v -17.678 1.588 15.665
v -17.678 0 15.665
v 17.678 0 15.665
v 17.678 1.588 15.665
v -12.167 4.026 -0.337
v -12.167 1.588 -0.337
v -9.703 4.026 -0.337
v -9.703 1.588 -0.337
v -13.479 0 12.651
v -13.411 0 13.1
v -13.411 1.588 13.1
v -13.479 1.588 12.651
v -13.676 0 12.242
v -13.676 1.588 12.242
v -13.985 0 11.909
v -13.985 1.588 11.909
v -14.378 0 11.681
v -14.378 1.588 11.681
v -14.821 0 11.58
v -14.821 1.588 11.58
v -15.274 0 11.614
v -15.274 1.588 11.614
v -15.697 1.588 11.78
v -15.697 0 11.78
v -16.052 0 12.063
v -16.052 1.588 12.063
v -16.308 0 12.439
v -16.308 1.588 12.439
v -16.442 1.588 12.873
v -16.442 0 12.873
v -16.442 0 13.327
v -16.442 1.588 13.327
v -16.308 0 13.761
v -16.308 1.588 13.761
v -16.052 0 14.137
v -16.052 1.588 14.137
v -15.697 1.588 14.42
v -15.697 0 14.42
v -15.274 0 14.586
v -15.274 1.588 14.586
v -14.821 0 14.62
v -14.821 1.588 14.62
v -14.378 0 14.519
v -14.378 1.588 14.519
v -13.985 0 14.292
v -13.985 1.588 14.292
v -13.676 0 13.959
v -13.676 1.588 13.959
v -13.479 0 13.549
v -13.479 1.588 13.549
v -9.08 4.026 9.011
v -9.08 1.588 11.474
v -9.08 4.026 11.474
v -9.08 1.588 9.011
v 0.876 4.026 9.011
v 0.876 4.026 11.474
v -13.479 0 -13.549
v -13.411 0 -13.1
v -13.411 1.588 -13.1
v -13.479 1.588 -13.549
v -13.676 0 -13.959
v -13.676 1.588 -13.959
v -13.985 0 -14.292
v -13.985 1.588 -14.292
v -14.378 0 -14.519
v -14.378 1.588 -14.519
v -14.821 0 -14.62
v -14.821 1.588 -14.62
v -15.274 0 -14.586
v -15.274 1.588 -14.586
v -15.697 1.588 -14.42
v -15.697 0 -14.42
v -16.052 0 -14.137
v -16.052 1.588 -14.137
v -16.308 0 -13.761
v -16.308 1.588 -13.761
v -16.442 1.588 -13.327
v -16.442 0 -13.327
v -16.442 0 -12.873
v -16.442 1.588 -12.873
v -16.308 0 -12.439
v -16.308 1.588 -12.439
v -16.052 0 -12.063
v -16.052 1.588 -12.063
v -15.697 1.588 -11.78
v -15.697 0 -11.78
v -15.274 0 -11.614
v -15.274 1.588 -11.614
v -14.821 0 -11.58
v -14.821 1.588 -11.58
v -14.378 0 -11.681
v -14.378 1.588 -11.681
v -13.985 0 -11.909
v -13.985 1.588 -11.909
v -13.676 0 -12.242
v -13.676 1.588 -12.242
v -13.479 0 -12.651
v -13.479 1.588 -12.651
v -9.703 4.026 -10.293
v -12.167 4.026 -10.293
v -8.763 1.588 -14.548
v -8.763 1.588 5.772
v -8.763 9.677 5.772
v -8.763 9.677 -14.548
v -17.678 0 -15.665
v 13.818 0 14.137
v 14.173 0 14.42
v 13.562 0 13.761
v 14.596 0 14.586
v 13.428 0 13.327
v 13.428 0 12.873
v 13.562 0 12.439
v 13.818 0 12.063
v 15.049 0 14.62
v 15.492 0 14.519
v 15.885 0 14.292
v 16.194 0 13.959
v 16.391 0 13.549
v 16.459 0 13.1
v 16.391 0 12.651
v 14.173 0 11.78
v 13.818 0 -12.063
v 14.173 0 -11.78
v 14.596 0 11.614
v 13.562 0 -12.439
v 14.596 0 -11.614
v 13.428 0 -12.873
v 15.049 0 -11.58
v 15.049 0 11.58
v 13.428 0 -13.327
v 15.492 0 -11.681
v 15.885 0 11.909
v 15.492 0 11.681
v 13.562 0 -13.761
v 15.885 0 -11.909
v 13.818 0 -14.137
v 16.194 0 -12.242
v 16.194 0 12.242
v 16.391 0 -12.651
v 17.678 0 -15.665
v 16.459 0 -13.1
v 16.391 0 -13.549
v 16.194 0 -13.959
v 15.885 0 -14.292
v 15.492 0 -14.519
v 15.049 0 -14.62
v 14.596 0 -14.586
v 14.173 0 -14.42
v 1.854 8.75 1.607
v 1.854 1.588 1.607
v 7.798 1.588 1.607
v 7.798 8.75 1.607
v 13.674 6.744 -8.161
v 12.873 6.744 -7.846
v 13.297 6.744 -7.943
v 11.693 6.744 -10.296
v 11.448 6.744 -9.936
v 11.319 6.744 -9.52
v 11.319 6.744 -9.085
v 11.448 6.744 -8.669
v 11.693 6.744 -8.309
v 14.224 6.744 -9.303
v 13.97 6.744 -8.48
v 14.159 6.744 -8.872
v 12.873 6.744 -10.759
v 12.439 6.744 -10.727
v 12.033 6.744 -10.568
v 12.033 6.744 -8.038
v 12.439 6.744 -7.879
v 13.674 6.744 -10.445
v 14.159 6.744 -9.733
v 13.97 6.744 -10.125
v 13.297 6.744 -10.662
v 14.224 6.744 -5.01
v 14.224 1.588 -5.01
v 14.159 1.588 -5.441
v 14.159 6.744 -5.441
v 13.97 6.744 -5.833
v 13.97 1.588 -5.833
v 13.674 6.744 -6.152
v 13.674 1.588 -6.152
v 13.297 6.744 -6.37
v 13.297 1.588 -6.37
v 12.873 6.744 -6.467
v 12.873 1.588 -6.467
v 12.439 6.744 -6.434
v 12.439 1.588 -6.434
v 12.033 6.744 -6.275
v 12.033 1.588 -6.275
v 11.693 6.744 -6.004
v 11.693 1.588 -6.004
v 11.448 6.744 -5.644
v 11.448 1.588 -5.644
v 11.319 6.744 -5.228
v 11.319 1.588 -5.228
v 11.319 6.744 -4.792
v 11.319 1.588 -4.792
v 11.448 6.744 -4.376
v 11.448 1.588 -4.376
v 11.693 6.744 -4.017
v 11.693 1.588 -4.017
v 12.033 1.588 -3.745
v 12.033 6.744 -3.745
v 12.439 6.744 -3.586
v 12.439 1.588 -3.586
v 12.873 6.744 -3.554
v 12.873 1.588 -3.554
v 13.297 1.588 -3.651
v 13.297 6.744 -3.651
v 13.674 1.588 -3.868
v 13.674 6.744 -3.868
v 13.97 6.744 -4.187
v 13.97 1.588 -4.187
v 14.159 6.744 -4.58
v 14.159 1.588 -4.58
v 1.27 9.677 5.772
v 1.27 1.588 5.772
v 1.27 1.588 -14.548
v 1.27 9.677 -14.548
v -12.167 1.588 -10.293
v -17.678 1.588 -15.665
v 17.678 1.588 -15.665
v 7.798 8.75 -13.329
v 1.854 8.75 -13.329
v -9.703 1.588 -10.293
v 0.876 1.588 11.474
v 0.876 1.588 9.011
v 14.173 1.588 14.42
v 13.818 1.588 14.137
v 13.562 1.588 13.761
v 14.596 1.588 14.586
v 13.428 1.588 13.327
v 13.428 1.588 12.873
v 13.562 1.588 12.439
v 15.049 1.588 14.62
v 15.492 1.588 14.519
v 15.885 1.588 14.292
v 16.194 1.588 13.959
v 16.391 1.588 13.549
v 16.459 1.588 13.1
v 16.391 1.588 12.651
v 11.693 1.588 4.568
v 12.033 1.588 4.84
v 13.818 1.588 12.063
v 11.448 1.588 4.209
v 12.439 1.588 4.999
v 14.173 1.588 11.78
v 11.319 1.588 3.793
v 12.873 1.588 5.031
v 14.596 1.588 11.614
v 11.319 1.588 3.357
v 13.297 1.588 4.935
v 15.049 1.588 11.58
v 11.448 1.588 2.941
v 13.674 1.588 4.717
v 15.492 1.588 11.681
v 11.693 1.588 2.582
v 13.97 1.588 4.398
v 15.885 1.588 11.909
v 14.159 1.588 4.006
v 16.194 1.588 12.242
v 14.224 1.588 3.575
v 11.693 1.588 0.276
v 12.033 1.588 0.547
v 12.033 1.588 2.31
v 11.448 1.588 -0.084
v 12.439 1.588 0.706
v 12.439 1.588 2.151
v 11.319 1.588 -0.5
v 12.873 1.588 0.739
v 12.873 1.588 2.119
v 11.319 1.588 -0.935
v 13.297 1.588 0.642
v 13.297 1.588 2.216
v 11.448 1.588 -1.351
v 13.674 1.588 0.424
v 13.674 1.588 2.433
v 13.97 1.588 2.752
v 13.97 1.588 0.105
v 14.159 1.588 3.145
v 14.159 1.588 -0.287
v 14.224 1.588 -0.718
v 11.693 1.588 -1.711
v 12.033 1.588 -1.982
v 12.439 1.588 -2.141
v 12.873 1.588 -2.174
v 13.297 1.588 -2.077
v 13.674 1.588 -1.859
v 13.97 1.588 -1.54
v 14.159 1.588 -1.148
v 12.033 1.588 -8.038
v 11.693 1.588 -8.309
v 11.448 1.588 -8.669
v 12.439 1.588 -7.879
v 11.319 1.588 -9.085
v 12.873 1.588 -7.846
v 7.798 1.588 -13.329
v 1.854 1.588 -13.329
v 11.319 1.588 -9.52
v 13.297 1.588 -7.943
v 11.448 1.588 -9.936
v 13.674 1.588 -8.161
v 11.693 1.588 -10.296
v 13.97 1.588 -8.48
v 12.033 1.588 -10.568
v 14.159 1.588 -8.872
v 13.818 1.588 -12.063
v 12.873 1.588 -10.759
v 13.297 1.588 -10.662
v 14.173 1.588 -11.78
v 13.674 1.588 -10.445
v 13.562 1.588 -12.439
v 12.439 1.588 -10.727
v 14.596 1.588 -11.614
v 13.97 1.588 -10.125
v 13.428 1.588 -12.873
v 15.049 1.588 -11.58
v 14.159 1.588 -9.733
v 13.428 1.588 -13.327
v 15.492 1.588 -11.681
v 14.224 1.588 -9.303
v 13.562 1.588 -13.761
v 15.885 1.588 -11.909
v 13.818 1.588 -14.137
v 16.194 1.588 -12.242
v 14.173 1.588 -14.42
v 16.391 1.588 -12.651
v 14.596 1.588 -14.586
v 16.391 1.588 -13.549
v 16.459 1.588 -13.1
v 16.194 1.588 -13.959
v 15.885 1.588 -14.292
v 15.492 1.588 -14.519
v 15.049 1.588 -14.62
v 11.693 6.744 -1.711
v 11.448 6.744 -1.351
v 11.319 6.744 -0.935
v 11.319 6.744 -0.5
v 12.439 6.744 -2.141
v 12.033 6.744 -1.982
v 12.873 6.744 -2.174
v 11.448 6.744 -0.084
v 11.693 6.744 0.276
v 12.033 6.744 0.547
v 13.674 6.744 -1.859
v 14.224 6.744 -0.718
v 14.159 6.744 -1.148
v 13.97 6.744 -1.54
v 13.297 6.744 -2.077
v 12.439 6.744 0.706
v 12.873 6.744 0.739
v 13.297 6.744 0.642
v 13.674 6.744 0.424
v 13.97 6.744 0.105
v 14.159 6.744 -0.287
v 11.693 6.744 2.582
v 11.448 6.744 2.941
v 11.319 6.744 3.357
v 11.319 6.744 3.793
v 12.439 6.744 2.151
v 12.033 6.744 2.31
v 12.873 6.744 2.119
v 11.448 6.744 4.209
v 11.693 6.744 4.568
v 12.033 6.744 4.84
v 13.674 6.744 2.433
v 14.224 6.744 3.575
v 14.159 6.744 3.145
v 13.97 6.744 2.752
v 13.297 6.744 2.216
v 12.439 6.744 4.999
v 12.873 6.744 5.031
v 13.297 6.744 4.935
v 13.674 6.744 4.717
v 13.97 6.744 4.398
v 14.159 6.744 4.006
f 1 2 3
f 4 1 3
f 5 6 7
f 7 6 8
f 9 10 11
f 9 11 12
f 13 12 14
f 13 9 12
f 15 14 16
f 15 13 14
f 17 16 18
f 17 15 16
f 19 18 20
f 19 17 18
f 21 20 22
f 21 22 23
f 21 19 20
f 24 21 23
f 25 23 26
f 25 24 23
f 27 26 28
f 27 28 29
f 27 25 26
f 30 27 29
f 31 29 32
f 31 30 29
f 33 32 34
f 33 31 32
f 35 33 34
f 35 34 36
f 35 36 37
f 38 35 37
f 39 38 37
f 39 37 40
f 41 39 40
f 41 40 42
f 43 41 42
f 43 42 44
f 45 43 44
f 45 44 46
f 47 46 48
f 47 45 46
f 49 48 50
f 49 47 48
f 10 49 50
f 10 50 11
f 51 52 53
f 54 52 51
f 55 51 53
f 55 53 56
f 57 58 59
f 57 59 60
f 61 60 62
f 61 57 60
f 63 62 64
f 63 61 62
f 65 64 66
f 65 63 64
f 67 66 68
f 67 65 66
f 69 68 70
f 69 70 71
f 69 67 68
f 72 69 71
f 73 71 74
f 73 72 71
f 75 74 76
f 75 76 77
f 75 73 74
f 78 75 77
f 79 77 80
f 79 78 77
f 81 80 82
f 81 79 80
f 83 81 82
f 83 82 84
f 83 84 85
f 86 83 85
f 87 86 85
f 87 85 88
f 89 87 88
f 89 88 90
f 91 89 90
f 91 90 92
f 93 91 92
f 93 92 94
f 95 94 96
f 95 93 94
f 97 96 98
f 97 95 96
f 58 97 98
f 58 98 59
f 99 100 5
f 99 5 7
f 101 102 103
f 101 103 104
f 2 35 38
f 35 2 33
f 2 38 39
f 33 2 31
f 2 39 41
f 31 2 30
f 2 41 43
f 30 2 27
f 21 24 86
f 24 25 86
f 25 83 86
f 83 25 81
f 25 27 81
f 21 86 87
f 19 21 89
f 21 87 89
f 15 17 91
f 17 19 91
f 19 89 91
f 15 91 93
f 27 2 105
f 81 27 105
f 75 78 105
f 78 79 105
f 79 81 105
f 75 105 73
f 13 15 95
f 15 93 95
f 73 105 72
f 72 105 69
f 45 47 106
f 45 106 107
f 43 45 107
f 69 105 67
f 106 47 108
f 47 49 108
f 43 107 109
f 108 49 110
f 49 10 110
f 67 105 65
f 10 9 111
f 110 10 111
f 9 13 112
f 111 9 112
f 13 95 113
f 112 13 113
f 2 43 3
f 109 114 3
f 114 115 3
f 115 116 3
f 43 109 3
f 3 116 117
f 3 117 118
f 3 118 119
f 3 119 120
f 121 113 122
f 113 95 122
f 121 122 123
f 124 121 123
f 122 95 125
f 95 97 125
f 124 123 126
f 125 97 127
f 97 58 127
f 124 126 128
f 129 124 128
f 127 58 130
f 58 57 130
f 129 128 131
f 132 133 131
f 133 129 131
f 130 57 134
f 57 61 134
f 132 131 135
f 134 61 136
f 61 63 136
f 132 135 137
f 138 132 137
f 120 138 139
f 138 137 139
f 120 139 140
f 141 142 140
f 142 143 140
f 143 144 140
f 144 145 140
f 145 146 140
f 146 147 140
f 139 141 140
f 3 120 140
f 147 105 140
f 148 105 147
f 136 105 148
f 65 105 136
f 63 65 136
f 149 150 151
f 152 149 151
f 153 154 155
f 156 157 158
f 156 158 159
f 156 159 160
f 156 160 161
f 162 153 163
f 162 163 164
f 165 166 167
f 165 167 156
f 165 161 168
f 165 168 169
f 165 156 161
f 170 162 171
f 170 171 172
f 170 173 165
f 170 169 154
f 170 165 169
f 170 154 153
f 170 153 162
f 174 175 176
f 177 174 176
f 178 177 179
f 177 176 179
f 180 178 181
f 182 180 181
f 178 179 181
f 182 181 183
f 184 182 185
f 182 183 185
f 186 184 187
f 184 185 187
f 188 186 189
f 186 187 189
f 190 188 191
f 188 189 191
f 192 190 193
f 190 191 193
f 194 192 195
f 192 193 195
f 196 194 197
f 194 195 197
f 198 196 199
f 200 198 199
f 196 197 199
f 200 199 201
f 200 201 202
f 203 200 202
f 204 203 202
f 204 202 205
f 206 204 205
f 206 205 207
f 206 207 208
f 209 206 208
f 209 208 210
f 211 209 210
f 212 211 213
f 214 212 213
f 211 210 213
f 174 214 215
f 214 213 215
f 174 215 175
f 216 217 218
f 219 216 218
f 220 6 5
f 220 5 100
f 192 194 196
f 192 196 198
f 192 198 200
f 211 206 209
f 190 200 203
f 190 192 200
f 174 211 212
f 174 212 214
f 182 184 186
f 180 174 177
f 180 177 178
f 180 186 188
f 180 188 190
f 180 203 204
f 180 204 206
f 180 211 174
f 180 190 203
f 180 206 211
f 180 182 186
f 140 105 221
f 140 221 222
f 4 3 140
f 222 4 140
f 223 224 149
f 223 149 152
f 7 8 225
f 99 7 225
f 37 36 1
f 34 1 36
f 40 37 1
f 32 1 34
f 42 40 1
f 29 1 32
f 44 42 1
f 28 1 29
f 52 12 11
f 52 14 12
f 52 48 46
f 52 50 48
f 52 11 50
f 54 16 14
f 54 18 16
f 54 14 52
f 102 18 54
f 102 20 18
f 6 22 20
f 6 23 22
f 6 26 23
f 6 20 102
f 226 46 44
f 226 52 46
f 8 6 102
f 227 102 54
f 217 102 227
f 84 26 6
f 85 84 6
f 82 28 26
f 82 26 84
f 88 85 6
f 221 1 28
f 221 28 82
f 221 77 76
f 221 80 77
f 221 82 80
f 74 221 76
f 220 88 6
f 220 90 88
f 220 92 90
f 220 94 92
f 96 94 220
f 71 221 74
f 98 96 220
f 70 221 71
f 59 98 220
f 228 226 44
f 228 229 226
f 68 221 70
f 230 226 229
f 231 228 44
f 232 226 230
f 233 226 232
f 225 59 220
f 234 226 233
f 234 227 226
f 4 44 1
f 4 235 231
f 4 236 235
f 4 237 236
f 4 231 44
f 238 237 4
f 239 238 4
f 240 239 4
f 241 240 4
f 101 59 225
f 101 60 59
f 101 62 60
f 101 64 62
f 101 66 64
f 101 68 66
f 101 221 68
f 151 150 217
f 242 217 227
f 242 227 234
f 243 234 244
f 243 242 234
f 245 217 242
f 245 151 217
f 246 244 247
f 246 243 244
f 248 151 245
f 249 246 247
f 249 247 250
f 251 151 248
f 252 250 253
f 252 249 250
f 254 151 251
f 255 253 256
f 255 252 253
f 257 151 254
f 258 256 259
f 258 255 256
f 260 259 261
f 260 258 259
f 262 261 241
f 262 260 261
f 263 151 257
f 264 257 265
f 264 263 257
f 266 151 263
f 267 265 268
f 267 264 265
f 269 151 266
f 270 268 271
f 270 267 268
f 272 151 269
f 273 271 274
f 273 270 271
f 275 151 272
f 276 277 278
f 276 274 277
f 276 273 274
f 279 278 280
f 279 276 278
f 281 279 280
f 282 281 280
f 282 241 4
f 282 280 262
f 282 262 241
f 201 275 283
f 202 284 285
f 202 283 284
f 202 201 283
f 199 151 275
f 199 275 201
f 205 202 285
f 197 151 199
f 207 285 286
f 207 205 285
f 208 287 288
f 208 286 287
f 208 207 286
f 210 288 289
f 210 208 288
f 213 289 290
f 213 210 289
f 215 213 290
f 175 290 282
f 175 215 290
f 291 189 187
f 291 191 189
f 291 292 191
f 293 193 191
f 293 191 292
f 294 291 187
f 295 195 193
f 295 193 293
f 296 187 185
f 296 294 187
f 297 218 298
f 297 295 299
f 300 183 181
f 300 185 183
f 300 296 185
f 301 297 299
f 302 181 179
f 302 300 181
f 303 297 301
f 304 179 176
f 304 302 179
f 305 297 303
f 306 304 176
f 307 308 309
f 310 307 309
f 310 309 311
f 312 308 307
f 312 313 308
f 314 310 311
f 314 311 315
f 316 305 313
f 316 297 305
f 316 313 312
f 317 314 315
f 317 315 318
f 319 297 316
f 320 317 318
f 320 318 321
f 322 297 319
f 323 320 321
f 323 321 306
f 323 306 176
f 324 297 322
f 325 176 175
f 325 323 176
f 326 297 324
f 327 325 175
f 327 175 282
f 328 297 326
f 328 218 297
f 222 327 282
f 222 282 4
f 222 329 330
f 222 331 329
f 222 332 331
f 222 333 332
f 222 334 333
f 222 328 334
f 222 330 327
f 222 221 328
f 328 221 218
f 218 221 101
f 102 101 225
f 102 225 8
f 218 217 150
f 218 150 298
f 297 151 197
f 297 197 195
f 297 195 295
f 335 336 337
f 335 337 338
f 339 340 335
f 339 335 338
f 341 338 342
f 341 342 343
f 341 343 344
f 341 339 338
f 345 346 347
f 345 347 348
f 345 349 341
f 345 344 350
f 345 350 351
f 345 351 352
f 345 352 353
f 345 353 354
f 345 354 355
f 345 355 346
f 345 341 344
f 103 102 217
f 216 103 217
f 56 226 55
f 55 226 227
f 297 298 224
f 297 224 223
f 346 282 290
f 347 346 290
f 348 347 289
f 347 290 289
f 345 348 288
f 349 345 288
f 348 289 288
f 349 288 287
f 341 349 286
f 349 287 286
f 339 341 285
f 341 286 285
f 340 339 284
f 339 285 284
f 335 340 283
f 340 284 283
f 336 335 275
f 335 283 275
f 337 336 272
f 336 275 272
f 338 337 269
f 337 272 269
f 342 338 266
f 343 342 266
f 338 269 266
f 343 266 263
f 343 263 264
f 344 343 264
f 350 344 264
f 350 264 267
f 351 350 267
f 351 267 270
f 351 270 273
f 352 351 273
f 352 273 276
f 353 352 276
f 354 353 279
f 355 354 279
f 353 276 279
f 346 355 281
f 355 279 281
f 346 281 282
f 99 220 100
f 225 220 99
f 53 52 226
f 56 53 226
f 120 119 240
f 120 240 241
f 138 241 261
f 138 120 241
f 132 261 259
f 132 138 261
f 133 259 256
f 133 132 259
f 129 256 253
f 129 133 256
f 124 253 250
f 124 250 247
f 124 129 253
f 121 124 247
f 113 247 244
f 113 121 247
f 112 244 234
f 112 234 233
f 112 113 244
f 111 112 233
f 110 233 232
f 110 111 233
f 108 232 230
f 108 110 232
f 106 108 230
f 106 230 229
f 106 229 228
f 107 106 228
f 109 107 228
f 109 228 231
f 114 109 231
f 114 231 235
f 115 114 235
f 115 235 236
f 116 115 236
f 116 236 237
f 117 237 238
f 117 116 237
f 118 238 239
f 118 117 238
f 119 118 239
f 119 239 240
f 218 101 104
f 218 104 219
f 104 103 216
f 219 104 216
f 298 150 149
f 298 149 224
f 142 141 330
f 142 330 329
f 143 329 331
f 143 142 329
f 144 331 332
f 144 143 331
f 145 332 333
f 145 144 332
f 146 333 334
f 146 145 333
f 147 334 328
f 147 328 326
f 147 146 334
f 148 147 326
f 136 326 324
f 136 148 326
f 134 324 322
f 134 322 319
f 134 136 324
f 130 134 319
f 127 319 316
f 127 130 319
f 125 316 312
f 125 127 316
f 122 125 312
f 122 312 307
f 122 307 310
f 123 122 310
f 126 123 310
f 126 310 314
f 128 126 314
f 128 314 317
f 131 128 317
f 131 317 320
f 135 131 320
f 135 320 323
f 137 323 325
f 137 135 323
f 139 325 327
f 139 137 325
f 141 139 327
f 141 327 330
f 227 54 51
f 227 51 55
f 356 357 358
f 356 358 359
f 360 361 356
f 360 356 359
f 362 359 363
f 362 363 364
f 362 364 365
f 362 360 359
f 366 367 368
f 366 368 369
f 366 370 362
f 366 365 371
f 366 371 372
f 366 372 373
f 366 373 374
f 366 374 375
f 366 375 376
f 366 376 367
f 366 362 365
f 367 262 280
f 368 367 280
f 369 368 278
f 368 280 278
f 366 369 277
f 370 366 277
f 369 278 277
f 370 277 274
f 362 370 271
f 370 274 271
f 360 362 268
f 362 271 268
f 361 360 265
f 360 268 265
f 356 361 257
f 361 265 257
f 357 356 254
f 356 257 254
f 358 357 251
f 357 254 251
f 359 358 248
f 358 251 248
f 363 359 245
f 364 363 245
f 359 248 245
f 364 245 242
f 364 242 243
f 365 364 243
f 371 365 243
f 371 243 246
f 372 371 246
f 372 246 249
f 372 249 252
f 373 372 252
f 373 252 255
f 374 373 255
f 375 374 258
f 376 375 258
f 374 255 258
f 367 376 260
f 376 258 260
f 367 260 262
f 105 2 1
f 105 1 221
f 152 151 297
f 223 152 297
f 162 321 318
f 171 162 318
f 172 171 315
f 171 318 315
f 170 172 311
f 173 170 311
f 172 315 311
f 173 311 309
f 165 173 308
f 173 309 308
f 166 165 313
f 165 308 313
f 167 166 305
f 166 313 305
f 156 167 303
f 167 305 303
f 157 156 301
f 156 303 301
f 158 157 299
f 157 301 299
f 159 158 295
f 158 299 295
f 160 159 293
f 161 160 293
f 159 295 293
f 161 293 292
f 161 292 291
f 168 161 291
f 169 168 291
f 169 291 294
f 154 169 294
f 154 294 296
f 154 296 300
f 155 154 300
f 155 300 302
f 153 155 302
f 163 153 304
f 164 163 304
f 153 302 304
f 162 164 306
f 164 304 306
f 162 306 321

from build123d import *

# Parameters (mm, degrees)
SKETCH1_W           = 35.3568
SKETCH1_H           = 31.3309
SKETCH1_R           = 1.524
BOSS_EXTRUDE1_DEPTH = 1.5875
SKETCH2_W           = 2.4638
SKETCH2_H           = 9.9568
SKETCH2_W_2         = 9.9568
SKETCH2_H_2         = 2.4638
BOSS_EXTRUDE2_DEPTH = 2.4384
SKETCH3_W           = 10.033
SKETCH3_H           = 20.32
BOSS_EXTRUDE3_DEPTH = 8.0899
SKETCH4_W           = 5.9436
SKETCH4_H           = 14.9352
BOSS_EXTRUDE4_DEPTH = 7.1628
SKETCH5_R           = 1.4605
BOSS_EXTRUDE5_DEPTH = 5.1562


with BuildPart() as part:
    # Sketch1 → Boss-Extrude1 (new body)
    with BuildSketch(Plane(origin=(0, 0, 0), x_dir=(1, 0, 0), z_dir=(0, 1, 0))):
        Rectangle(SKETCH1_W, SKETCH1_H)
        with Locations((14.9352, -13.10005)):
            Circle(SKETCH1_R, mode=Mode.SUBTRACT)
        with Locations((14.9352, 13.10005)):
            Circle(SKETCH1_R, mode=Mode.SUBTRACT)
        with Locations((-14.9352, -13.10005)):
            Circle(SKETCH1_R, mode=Mode.SUBTRACT)
        with Locations((-14.9352, 13.10005)):
            Circle(SKETCH1_R, mode=Mode.SUBTRACT)
    extrude(amount=BOSS_EXTRUDE1_DEPTH)

    # Sketch2 → Boss-Extrude2 (add)
    with BuildSketch(Plane(origin=(0, 1.5875, 0), x_dir=(1, 0, 0), z_dir=(0, 1, 0))):
        with Locations((-10.9347, 5.31495)):
            Rectangle(SKETCH2_W, SKETCH2_H)
        with Locations((-4.1021, -10.24255)):
            Rectangle(SKETCH2_W_2, SKETCH2_H_2)
    extrude(amount=BOSS_EXTRUDE2_DEPTH)

    # Sketch3 → Boss-Extrude3 (add)
    with BuildSketch(Plane(origin=(0, 1.5875, 0), x_dir=(1, 0, 0), z_dir=(0, 1, 0))):
        with Locations((-3.7465, 4.38785)):
            Rectangle(SKETCH3_W, SKETCH3_H)
    extrude(amount=BOSS_EXTRUDE3_DEPTH)

    # Sketch4 → Boss-Extrude4 (add)
    with BuildSketch(Plane(origin=(0, 1.5875, 0), x_dir=(1, 0, 0), z_dir=(0, 1, 0))):
        with Locations((4.826, 5.86105)):
            Rectangle(SKETCH4_W, SKETCH4_H)
    extrude(amount=BOSS_EXTRUDE4_DEPTH)

    # Sketch5 → Boss-Extrude5 (add)
    with BuildSketch(Plane(origin=(0, 1.5875, 0), x_dir=(1, 0, 0), z_dir=(0, 1, 0))):
        with Locations((12.7635, 9.30275)):
            Circle(SKETCH5_R)
        with Locations((12.7635, 5.01015)):
            Circle(SKETCH5_R)
        with Locations((12.7635, 0.71755)):
            Circle(SKETCH5_R)
        with Locations((12.7635, -3.57505)):
            Circle(SKETCH5_R)
    extrude(amount=BOSS_EXTRUDE5_DEPTH)


solid = part.part
